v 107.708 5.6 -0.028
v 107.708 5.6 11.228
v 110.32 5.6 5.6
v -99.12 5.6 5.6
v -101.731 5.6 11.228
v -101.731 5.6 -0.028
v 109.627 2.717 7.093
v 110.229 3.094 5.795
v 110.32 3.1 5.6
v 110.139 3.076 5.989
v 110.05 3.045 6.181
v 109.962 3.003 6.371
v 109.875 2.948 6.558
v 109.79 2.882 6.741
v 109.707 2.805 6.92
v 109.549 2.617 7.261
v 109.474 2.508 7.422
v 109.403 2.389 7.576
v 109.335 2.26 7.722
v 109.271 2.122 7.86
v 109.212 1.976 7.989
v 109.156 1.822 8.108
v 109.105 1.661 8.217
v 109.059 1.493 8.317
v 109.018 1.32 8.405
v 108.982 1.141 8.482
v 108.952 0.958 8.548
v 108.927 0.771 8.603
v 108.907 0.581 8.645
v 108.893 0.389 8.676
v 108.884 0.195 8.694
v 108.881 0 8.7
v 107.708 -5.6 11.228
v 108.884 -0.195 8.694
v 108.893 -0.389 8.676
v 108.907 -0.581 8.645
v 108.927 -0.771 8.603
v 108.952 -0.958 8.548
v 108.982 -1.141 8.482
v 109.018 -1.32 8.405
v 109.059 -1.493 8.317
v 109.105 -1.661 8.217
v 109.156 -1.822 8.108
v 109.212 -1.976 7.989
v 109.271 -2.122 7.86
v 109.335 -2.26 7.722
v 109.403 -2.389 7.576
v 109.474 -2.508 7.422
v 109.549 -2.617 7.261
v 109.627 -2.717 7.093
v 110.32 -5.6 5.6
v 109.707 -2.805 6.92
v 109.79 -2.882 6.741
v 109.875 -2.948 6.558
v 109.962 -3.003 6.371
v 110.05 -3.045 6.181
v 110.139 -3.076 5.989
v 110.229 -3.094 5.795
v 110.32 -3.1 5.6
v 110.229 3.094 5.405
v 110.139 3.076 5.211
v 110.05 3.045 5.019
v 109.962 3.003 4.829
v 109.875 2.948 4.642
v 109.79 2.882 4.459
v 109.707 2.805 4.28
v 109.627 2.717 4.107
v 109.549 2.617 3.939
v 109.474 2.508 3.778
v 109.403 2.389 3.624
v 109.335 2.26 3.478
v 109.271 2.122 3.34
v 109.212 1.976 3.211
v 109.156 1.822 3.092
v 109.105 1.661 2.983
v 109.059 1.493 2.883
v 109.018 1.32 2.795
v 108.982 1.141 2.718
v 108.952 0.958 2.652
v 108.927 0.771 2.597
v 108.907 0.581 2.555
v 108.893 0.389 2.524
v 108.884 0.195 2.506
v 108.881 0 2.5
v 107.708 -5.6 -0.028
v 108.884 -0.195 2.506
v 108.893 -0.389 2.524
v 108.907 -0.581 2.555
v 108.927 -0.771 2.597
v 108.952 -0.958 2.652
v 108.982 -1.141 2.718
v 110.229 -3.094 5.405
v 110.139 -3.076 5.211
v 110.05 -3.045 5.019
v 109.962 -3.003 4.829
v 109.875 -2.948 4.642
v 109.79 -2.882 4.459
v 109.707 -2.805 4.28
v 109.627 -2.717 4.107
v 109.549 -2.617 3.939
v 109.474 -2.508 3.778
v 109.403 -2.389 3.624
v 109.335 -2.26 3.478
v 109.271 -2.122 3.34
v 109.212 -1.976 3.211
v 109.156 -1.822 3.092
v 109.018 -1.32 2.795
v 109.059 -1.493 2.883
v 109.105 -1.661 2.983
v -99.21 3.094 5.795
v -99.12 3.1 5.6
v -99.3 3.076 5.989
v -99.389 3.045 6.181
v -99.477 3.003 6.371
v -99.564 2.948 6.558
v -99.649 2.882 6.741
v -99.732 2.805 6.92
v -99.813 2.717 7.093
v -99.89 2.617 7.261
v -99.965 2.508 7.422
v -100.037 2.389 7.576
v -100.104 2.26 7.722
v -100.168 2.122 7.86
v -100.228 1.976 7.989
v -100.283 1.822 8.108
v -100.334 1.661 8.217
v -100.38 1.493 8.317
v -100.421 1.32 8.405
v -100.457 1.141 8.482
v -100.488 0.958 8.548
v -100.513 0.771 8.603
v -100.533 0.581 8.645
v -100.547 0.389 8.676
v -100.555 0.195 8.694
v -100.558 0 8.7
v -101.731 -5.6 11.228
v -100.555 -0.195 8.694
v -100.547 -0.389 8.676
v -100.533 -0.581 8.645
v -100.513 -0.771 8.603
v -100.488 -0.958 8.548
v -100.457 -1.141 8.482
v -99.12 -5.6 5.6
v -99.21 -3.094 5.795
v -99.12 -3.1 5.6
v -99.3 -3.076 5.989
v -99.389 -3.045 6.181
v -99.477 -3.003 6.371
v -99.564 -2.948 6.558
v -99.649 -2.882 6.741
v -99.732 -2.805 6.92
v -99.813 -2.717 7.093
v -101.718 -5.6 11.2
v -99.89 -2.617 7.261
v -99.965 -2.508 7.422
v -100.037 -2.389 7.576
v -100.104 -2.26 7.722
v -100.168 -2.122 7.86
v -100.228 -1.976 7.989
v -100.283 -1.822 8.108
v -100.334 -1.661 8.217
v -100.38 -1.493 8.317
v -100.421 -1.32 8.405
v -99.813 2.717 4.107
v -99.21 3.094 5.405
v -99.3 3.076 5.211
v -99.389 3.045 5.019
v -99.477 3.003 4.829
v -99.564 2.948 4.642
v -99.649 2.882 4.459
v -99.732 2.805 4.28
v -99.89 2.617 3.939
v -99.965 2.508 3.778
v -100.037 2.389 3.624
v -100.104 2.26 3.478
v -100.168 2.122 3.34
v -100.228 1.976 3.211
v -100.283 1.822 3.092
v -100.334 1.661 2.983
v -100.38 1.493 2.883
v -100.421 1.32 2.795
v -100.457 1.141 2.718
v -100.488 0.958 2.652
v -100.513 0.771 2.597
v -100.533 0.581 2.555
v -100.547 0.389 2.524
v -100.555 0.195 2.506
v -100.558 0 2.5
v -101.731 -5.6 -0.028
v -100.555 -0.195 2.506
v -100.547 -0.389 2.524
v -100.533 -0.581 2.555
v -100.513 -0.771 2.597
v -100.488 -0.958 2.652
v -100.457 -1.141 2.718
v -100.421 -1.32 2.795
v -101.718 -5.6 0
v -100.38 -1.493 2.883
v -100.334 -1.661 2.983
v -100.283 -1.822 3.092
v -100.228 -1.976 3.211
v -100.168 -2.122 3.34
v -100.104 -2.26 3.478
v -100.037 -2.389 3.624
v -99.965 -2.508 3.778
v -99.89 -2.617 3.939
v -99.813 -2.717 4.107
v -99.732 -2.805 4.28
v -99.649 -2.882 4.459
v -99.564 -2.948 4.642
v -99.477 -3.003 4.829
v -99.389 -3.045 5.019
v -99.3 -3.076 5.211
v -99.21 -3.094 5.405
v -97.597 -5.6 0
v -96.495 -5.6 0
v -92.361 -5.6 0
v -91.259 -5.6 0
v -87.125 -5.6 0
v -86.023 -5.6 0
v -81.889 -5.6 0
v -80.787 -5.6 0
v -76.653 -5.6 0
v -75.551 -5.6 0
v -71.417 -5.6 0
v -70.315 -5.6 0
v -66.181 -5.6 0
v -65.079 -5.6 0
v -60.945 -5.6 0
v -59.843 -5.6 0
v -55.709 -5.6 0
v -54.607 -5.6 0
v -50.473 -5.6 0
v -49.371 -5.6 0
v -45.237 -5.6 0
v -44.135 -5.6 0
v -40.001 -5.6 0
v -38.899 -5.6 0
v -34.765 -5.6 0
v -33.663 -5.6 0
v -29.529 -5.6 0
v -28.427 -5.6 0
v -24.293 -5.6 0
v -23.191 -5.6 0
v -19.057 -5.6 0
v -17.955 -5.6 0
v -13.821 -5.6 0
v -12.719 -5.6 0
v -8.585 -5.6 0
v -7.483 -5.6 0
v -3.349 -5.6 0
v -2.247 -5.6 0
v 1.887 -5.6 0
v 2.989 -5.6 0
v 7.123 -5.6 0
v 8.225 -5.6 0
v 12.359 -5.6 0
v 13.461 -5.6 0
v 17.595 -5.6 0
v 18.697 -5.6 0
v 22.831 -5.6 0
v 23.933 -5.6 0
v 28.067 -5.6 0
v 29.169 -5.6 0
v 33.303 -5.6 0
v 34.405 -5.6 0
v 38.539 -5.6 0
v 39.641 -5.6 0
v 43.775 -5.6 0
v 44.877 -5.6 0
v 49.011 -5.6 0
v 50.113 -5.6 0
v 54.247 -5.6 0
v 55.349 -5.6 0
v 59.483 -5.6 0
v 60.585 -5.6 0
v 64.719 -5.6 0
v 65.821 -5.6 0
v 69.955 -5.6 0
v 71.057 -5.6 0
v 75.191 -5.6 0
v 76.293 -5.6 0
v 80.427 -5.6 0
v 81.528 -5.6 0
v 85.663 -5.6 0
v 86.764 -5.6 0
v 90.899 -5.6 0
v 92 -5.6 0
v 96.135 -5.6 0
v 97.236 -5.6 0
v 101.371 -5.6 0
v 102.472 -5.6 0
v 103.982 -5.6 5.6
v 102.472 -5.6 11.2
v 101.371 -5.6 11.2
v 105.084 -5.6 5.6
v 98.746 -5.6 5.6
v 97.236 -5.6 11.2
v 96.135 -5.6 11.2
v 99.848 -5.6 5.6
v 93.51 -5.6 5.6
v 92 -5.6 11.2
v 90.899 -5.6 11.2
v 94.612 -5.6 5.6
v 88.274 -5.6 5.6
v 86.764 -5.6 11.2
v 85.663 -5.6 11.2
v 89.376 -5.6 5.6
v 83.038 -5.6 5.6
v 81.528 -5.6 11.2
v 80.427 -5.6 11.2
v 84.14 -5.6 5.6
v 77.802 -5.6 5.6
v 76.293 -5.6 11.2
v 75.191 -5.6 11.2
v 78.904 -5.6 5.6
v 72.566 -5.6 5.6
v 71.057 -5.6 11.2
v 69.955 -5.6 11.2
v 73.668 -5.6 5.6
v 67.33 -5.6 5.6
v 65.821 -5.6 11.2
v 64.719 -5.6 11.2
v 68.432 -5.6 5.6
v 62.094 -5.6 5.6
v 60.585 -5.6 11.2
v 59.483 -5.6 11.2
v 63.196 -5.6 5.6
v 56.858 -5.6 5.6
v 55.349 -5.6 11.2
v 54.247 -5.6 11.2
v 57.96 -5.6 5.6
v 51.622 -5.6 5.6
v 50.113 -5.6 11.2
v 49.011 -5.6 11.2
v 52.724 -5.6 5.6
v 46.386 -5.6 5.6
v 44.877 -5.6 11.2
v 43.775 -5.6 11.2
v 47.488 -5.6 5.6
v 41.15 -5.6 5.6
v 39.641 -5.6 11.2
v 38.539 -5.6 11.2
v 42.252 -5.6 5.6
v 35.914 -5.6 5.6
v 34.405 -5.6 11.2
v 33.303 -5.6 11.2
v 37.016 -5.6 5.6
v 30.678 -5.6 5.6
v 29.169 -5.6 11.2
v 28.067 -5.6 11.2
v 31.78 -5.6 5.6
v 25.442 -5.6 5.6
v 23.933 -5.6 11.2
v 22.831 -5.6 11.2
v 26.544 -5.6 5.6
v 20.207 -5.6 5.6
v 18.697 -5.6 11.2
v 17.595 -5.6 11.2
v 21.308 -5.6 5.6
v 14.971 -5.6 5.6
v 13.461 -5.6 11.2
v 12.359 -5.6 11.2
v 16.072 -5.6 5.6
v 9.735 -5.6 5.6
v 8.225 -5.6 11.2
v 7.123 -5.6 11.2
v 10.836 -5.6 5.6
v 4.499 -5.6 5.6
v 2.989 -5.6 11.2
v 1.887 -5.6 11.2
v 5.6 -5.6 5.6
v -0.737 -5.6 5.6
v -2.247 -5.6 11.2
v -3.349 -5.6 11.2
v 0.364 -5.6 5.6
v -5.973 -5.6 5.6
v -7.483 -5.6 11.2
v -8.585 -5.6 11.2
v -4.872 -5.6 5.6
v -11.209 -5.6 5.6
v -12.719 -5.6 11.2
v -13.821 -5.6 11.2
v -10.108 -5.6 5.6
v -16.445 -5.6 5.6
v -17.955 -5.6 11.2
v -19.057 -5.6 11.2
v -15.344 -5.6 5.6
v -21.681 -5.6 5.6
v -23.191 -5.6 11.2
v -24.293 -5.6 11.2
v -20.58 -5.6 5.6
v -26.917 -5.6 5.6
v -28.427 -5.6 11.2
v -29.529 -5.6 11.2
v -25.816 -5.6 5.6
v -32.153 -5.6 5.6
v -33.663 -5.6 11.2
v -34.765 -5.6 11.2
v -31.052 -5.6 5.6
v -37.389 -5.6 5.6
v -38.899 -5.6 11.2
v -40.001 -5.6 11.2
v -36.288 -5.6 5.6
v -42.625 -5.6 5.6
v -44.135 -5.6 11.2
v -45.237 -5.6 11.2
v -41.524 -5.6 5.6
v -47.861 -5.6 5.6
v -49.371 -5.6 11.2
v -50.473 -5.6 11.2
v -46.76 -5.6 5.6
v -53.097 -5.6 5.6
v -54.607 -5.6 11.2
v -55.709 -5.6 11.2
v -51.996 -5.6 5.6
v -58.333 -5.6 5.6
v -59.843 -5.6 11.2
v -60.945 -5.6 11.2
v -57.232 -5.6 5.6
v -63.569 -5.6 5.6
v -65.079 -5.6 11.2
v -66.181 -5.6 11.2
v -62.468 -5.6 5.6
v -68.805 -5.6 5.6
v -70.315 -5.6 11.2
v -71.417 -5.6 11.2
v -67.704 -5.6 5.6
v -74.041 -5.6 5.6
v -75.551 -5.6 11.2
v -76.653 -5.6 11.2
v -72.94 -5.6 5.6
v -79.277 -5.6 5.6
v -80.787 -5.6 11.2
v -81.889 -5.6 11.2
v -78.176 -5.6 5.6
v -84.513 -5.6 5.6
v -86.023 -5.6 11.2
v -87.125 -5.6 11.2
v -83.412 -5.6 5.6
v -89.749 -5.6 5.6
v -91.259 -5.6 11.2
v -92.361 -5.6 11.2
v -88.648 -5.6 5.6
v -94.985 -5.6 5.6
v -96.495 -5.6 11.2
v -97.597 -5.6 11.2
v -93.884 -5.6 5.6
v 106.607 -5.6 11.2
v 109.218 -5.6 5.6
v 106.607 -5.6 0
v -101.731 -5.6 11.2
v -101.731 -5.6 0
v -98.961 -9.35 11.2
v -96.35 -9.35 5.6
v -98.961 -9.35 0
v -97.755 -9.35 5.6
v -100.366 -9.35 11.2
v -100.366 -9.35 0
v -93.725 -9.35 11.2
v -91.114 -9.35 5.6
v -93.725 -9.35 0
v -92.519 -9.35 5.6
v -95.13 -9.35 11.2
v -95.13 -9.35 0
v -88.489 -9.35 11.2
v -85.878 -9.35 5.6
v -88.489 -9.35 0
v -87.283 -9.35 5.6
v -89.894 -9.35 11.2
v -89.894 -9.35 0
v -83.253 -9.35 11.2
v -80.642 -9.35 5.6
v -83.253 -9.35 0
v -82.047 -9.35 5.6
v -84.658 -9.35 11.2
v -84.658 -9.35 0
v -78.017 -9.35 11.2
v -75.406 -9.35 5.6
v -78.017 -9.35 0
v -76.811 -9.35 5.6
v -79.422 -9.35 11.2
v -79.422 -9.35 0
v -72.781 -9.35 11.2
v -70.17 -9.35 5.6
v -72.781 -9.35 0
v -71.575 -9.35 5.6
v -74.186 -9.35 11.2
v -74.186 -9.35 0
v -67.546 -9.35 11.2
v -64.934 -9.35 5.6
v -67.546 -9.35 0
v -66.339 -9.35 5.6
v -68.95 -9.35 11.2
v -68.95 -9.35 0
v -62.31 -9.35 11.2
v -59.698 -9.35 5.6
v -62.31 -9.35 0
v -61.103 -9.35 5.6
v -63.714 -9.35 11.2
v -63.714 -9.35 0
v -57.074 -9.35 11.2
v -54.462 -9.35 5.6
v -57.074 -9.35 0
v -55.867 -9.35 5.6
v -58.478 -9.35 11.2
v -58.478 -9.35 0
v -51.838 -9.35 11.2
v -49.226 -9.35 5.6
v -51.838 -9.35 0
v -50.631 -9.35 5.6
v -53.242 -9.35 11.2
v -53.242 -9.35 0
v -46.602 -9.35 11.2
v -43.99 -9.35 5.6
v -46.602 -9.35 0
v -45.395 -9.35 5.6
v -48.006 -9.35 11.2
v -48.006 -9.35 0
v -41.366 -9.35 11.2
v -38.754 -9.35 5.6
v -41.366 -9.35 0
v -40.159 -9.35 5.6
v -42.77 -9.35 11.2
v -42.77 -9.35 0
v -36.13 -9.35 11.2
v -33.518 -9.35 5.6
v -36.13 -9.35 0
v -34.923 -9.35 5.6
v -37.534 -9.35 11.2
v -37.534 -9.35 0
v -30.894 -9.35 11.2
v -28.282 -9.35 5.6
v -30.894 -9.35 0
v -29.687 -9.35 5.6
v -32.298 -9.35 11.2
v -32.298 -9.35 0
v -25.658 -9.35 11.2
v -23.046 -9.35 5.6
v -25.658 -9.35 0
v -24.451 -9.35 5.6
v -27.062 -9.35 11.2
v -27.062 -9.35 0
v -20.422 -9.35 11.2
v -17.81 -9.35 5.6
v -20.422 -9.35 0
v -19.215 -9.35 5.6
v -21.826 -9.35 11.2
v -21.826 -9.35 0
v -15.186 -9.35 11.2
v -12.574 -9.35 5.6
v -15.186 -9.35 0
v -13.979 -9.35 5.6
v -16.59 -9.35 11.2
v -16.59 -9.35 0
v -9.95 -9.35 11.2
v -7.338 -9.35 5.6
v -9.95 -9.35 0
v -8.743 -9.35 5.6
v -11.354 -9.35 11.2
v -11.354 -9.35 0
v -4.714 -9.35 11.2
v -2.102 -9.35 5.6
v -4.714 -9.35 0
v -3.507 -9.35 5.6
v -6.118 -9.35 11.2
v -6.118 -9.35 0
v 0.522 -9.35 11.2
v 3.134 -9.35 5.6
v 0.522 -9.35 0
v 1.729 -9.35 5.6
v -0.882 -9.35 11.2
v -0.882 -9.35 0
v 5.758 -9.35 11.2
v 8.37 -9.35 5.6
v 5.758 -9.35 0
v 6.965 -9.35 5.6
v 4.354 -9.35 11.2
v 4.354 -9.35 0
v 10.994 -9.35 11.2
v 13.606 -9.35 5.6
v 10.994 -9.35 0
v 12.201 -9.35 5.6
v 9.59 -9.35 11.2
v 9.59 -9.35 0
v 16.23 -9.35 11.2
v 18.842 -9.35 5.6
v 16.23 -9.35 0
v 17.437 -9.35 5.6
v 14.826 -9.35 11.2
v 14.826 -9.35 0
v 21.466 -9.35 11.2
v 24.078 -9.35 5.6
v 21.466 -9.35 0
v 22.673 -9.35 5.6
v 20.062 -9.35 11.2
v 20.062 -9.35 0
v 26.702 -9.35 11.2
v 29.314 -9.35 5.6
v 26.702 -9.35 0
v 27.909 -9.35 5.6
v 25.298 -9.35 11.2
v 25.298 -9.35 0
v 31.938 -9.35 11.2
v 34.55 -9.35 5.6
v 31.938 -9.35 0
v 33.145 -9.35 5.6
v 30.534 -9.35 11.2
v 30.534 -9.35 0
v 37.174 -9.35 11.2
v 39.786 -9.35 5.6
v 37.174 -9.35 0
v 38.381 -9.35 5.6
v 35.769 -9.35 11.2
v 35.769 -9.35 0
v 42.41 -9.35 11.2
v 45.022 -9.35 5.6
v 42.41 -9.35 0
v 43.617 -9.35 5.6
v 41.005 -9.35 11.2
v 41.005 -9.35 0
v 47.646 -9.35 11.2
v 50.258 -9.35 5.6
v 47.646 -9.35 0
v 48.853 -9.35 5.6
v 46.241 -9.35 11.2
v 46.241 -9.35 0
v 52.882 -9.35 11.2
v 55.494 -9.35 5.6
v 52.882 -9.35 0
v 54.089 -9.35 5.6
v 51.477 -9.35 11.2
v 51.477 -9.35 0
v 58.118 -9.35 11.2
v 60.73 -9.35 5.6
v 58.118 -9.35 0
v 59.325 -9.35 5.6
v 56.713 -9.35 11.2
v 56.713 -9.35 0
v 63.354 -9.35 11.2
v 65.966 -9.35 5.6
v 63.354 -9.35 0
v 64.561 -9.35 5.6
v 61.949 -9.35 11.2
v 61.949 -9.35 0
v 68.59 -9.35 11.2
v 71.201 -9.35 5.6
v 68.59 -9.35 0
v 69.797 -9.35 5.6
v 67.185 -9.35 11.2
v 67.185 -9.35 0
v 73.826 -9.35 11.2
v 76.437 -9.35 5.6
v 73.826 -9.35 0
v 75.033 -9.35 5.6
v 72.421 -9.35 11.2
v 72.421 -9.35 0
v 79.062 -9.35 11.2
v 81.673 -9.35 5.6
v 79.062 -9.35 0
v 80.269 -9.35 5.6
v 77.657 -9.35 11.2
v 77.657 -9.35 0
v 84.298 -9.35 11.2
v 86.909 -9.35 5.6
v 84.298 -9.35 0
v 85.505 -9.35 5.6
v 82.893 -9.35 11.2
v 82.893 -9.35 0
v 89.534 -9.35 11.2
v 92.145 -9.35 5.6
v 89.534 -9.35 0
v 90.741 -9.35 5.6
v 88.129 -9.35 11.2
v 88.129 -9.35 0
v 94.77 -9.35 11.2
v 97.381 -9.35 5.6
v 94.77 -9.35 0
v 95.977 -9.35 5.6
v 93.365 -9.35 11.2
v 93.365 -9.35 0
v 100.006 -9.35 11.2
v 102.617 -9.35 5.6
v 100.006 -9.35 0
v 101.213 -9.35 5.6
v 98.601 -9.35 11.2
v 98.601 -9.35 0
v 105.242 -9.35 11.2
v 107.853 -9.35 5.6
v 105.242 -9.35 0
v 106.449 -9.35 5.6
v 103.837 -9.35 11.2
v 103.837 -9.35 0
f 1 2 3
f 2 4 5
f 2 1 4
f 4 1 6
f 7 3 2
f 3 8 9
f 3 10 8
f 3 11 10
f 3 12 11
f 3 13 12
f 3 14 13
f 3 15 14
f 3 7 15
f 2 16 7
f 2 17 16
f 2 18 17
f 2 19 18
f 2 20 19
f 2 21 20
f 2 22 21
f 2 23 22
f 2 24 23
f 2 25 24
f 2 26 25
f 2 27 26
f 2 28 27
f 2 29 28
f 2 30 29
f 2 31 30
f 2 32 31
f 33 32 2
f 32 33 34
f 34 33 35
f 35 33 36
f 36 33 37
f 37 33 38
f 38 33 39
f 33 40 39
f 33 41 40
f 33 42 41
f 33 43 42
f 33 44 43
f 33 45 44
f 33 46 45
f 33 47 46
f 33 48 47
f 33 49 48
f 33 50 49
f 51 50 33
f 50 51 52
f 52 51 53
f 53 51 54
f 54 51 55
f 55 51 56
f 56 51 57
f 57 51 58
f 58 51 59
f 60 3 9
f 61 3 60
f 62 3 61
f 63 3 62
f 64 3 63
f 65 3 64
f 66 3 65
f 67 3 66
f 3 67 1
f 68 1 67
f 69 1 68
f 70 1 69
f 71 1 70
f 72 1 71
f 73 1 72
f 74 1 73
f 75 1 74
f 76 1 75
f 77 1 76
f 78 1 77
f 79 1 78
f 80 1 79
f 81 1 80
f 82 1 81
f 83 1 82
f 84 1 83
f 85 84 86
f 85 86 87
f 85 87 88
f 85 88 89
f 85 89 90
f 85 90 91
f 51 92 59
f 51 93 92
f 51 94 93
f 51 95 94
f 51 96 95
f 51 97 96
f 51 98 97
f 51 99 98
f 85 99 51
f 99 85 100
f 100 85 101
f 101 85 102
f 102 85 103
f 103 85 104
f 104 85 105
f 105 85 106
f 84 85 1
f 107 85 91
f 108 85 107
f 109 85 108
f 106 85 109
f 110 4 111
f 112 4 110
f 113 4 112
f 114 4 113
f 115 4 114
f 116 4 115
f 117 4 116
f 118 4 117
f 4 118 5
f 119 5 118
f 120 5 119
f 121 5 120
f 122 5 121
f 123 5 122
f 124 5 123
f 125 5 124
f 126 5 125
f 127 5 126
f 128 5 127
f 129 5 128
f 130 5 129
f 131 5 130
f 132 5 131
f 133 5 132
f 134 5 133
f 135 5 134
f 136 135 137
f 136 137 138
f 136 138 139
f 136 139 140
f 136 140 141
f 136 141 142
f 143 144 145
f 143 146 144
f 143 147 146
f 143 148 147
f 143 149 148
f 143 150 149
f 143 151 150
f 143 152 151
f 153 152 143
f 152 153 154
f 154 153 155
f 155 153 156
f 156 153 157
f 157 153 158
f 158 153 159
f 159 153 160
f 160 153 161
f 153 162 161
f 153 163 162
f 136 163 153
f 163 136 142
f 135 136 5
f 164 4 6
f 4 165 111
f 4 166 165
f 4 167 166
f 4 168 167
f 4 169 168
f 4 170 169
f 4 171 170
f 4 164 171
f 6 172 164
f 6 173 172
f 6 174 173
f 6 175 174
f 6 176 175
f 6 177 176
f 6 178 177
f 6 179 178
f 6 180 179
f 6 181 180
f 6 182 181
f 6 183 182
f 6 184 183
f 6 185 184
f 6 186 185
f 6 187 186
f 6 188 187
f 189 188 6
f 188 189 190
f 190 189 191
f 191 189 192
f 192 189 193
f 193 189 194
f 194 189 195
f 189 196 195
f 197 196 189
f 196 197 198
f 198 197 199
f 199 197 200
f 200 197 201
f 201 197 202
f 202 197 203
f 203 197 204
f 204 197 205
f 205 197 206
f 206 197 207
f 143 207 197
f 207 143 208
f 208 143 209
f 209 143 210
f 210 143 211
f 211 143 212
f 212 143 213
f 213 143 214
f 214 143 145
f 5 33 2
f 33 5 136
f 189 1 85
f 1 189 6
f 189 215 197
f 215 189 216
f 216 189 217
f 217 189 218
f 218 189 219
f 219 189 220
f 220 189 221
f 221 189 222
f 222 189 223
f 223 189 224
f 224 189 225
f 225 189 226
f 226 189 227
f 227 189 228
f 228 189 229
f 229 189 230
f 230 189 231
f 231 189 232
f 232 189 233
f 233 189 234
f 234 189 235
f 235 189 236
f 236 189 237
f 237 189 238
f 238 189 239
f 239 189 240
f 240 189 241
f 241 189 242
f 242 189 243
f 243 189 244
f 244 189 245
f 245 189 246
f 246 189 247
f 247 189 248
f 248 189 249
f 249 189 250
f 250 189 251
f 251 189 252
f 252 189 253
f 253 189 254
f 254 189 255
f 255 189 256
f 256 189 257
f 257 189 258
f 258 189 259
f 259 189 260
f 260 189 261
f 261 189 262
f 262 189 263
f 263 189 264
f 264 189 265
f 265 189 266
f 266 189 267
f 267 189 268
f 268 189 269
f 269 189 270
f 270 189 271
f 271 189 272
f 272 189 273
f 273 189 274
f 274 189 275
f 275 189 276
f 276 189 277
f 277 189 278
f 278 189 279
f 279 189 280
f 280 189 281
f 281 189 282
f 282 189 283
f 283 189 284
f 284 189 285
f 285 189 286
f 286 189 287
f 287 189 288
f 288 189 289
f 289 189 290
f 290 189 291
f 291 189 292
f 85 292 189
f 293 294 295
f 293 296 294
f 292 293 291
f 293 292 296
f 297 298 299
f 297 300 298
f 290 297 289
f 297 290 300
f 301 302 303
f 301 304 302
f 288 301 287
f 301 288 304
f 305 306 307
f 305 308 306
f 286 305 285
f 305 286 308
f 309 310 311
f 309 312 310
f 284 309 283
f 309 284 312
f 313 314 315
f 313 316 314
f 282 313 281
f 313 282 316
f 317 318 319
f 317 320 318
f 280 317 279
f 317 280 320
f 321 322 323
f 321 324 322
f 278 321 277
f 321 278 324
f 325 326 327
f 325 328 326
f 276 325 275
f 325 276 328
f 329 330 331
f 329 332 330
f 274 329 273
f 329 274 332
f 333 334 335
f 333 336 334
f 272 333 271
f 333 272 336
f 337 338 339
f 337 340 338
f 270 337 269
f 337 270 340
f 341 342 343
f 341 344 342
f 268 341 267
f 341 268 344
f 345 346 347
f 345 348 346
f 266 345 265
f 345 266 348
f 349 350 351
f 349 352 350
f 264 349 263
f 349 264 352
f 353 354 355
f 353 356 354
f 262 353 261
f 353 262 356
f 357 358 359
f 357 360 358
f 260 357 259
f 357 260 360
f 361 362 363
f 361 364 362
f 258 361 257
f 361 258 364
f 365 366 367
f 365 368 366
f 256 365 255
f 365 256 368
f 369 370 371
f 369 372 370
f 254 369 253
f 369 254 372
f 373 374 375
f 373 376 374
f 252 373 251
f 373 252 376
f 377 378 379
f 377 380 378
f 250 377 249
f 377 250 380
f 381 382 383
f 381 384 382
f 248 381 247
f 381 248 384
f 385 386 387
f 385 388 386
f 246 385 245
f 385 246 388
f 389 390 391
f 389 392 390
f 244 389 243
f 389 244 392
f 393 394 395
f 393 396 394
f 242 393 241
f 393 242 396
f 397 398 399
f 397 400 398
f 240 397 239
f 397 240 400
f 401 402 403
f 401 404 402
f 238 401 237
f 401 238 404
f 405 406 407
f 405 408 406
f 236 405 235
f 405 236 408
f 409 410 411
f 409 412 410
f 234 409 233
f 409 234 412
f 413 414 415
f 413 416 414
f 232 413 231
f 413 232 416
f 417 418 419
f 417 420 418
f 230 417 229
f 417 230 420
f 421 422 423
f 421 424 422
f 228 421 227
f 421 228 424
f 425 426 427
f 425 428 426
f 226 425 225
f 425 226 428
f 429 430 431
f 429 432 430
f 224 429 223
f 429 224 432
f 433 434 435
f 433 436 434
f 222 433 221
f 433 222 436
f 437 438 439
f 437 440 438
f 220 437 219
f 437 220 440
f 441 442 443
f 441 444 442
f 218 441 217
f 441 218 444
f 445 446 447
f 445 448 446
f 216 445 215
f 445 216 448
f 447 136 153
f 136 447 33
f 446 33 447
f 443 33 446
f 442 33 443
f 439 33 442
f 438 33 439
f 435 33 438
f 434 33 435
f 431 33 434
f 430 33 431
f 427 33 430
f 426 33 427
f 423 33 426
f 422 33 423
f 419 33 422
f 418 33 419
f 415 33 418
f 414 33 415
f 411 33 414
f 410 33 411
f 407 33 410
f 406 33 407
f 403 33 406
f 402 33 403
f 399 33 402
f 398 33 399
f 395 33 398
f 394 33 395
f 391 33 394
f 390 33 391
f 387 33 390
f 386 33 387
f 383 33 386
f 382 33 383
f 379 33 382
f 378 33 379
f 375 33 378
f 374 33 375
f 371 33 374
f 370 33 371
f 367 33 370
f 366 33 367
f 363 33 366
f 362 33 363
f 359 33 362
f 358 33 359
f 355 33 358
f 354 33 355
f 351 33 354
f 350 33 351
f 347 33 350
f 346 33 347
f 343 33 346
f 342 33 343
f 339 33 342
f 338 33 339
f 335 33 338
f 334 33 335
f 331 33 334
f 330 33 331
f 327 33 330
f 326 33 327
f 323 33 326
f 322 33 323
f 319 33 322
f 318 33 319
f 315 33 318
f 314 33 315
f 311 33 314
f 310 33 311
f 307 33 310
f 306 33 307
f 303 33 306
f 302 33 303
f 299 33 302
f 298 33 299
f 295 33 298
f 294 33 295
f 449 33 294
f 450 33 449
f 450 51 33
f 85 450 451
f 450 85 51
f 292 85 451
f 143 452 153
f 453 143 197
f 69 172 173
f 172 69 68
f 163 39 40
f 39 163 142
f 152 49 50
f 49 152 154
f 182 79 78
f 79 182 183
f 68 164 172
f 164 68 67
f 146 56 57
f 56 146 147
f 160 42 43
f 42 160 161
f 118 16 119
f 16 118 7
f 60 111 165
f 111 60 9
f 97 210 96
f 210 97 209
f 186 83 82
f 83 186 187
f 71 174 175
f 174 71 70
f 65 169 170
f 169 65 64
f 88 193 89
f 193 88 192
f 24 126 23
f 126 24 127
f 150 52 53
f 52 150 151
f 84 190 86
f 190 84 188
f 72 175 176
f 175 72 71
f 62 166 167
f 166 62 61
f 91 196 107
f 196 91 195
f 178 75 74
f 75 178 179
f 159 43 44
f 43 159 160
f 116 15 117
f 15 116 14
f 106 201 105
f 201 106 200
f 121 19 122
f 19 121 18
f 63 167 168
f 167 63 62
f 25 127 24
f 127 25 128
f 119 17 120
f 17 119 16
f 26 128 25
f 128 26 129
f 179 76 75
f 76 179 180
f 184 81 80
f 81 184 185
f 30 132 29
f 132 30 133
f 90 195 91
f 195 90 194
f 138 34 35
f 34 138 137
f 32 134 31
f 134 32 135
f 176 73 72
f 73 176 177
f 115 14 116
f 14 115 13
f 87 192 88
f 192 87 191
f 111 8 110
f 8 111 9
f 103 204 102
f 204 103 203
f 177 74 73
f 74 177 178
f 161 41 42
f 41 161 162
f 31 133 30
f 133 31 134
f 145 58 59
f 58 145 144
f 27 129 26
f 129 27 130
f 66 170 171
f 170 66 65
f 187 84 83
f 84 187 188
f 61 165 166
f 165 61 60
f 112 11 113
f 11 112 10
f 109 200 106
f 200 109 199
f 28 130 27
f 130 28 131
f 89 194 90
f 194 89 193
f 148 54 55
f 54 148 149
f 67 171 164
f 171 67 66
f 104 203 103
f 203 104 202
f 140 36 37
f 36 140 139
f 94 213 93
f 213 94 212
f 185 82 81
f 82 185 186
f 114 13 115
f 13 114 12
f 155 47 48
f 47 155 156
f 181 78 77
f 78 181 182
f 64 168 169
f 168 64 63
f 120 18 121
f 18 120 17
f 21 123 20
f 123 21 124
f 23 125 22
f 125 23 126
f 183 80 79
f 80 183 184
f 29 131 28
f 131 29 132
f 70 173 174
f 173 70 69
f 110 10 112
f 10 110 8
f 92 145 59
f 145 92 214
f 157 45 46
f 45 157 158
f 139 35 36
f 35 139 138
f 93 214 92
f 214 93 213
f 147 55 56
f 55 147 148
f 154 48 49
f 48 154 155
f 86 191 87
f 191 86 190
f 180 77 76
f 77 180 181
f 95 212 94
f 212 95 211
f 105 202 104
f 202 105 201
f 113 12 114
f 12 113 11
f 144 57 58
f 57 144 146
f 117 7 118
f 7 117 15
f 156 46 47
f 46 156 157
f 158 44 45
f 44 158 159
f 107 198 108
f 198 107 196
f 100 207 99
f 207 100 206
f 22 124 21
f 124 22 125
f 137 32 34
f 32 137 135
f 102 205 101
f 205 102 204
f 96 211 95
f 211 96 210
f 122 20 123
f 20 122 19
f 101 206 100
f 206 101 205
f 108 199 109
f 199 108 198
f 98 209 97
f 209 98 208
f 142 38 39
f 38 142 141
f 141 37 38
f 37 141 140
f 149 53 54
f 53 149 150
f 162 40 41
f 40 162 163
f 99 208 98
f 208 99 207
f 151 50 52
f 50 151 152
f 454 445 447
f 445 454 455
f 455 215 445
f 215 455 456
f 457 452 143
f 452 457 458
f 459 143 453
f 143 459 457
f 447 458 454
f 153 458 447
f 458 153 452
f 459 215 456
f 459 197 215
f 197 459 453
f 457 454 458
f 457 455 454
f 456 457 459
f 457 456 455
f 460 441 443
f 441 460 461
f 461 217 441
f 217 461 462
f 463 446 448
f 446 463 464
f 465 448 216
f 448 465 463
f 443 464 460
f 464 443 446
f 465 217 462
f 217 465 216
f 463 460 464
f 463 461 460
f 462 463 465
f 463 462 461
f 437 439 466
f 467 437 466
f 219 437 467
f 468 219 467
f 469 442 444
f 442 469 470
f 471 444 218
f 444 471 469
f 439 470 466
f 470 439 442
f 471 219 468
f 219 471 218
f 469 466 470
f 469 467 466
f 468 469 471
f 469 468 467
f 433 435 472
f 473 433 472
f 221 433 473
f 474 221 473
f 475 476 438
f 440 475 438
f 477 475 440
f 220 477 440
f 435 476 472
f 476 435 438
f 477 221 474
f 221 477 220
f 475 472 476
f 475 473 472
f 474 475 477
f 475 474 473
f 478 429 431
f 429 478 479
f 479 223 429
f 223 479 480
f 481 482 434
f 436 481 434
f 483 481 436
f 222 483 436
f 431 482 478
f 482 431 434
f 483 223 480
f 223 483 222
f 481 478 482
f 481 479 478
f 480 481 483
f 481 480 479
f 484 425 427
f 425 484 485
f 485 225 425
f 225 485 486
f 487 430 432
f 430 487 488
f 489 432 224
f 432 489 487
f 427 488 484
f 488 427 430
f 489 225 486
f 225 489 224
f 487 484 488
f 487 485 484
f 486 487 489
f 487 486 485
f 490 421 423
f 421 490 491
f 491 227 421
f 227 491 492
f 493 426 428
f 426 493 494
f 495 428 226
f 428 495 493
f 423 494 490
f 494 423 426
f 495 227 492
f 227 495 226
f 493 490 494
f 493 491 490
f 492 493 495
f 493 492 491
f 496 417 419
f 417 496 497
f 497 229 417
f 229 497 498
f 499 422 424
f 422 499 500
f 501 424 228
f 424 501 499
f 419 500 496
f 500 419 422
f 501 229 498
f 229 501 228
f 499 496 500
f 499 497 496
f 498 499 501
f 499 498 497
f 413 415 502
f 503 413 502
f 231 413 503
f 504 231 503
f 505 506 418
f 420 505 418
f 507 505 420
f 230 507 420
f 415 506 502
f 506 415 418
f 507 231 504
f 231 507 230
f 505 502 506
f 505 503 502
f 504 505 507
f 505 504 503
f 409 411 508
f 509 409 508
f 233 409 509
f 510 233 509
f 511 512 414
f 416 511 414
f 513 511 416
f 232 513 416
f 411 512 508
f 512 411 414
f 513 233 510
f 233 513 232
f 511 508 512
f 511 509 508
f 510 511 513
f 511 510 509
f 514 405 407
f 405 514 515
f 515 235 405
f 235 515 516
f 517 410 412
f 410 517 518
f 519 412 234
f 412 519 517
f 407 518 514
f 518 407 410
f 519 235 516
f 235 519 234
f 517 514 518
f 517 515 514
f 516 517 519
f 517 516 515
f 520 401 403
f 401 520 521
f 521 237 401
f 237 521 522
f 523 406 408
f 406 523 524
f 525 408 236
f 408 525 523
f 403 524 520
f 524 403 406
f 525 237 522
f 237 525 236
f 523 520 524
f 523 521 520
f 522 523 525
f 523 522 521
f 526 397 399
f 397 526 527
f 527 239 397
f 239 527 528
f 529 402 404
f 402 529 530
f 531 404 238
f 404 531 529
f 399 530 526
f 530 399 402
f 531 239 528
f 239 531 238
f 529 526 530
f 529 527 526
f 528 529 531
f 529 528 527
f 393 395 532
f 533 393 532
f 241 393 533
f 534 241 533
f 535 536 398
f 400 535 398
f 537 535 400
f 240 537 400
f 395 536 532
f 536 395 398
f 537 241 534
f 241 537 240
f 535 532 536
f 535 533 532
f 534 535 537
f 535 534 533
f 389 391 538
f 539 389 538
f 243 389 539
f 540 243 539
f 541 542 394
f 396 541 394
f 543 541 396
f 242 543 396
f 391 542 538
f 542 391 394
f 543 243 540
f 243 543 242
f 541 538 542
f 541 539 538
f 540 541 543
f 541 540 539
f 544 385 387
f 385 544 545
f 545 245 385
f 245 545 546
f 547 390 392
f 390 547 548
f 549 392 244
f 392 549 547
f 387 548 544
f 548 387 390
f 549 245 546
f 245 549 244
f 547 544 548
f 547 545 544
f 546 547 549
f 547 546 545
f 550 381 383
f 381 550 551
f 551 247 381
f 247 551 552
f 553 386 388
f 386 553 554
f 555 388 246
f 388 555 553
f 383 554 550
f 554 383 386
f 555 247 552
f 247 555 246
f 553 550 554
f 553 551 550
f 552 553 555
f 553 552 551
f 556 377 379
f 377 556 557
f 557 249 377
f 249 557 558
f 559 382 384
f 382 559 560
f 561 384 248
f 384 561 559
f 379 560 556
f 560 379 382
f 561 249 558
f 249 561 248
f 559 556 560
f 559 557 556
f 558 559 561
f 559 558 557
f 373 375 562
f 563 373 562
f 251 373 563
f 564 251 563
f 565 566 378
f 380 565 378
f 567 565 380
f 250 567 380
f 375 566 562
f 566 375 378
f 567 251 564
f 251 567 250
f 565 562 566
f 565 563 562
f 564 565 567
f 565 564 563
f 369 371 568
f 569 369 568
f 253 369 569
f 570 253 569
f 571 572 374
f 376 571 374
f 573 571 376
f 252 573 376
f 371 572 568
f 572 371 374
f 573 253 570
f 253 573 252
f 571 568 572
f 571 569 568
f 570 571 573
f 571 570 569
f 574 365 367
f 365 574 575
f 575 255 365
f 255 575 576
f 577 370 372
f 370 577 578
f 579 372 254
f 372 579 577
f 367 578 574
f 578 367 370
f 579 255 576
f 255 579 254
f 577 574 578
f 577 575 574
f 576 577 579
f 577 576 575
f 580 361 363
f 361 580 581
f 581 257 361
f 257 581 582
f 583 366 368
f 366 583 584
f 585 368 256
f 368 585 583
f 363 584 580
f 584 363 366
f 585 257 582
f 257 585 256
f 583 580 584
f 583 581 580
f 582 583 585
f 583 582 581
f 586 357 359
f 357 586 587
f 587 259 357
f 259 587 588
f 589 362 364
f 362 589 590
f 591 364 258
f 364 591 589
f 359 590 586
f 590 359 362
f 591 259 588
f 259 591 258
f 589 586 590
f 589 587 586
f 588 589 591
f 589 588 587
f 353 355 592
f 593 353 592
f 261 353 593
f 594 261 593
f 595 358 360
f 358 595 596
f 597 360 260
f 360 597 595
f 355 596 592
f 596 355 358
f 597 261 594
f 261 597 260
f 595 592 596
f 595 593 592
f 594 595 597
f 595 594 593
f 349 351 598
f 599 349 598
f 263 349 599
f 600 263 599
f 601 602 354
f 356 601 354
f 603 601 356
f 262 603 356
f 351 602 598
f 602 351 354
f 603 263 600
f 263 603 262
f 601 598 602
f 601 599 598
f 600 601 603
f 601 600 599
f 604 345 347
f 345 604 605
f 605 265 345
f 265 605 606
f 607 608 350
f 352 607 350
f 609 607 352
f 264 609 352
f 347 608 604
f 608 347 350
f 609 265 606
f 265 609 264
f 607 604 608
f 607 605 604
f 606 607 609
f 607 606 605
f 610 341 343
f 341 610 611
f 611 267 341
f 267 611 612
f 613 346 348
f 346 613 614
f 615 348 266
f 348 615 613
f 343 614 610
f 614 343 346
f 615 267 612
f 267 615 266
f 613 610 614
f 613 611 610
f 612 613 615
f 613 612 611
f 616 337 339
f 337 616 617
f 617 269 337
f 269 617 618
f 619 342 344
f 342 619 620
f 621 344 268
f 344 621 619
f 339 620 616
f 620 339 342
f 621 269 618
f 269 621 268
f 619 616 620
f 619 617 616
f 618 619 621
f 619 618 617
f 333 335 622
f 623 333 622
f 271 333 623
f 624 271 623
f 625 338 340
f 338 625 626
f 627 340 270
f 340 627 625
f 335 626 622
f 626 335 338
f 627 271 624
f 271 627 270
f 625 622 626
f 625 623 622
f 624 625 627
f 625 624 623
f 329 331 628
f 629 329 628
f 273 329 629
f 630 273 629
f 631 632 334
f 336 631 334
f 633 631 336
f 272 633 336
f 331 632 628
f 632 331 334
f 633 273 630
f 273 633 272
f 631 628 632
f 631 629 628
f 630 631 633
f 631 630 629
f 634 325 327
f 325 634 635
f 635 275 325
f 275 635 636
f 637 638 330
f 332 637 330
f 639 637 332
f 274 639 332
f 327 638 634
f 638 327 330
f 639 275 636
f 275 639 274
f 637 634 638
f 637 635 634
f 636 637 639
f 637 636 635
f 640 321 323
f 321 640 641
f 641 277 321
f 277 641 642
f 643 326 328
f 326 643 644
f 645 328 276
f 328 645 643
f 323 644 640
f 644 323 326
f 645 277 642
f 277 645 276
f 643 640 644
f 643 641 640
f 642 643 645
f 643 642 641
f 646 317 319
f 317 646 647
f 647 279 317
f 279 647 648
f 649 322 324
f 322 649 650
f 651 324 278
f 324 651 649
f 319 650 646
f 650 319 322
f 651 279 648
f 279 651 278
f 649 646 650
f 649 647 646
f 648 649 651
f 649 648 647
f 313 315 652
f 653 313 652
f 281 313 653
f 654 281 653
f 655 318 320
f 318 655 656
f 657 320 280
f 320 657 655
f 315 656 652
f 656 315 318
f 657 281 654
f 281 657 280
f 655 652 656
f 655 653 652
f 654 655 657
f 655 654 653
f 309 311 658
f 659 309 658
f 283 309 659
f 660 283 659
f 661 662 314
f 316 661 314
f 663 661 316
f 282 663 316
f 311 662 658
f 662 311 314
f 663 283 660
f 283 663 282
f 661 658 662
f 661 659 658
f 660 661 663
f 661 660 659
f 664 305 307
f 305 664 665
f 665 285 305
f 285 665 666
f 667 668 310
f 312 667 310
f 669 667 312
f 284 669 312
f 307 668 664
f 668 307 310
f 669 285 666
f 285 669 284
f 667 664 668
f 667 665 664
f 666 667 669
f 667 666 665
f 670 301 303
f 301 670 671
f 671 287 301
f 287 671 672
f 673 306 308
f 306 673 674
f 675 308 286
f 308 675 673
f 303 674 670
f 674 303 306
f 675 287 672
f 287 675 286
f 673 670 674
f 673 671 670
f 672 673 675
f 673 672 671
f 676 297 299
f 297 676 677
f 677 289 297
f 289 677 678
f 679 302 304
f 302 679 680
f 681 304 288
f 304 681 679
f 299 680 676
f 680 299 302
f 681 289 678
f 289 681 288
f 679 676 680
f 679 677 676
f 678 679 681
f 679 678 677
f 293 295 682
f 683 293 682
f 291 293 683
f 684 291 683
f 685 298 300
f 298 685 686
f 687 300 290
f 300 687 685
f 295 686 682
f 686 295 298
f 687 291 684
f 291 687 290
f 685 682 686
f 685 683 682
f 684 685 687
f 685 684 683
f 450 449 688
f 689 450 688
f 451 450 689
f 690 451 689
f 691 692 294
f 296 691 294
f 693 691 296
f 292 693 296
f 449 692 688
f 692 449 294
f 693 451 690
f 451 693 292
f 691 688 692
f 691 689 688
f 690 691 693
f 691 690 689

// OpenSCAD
// Parametric Modular Rack Mark "Ckaos" Moissette
//Based on the work of MattMoses and Fdavies :
//http://forums.reprap.org/read.php?1,51452,52099#msg-52099
//and Forrest Higgs:
// http://technocraticanarchist.blogspot.com/2010/01/high-speed-alternative-to-belts.html
//It is licensed under the Creative Commons - GNU GPL license.
// © 2011 by Mark "Ckaos" Moissette
//more info at :www.kaosat.net and
//http://www.thingiverse.com/thing:6011



pi=3.1415926535897932384626433832795;
innerRadius=3.1;//shaft radius, in mm
borders=2.5;//how thick should the borders around the central "shaft" be, in mm
diametralPitch=12;
numberOfTeeth=40;
pressureAngle=20*pi/180;
centerAngle=25;//angle at center of teeth


//example usage
rack(innerRadius,borders,diametralPitch,numberOfTeeth,pressureAngle,centerAngle);



module rack(innerRadius,borders,P,N,PA,CA)
{
	// P = diametral pitch
	// N = number of teeth
	// PA = pressure angle in radians
	// x, y = linear offset distances
	a = 1/P; // addendum (also known as "module")
	d = 1.25/P; // dedendum (this is set by a standard)
	multiplier=20;//20
	height=(d+a)*multiplier;
	
	
	// find the tangent of pressure angle once
	tanPA = tan(PA*(180/pi));
	// length of bottom and top horizontal segments of tooth profile
	botL = (pi/P/2 - 2*d*tanPA)*multiplier;
	topL =( pi/P/2 - 2*a*tanPA)*multiplier;

	slantLng=tanPA*height;
	realBase=2*slantLng+topL;
	
	
	offset=topL+botL+2*slantLng;
	length=(realBase+botL)*N;

	supportSize=(innerRadius+borders)*2;

	//calculate tooth params
	basesegmentL=realBase/2;
	basesegmentW=supportSize/2;

	topsegmentL=topL/2;
	topsegmentW=supportSize/2;

	baseoffsetY=tan(CA)*basesegmentW;
	topoffsetY=tan(CA)*topsegmentW;
	
	//calculate support params

	totalSupportLength=(N)*(offset);
	supportL=totalSupportLength/2;
	supportW=supportSize/1.99;
	
	echo("Total length",totalSupportLength+baseoffsetY);
	echo("Total height",supportSize);

	
	rotate([90,90,0])
	{
	translate([-supportSize/2,supportSize/2,0])
	{
	union()
	{
		difference()
		{
			support(supportL,supportW,supportSize,baseoffsetY);
			rotate([90,90,0]) 
			{cylinder(h=length+10,r=innerRadius,center=true,$fn=100);}
		}

	
		for (i = [0:N-1]) 
		{
			translate([0,i*offset-length/2+realBase/2,supportSize/2+height/2]) 
			{	
				
				tooth(basesegmentL,basesegmentW,topsegmentL,topsegmentW,height,baseoffsetY,topoffsetY);
				
			}
		}
	}
	
	}
	}
}

module support(supportL,supportW,height,offsetY)
{
	 tooth(supportL,supportW,supportL,supportW,height,offsetY,offsetY);
}



module tooth(basesegmentL,basesegmentW,topsegmentL,topsegmentW,height,baseoffsetY,topoffsetY)//top : width*length, same for base
{
	
	////////////////
	basePT1=[
	-basesegmentW,
	basesegmentL-baseoffsetY,
	-height/2];

	basePT2=[
	0,
	basesegmentL,
	-height/2];

	basePT3=[
	basesegmentW,
	basesegmentL-baseoffsetY,
	-height/2];

	basePT4=[
	basesegmentW,
	basesegmentL-(baseoffsetY+basesegmentL*2),
	-height/2];
	
	basePT5=[
	0,
	-basesegmentL,
	-height/2];

	basePT6=[
	-basesegmentW,
	basesegmentL-(baseoffsetY+basesegmentL*2),
	-height/2];
	//////////////////////////
	topPT1=[
	-topsegmentW,
	topsegmentL-topoffsetY,
	height/2];

	topPT2=[
	0,
	topsegmentL,
	height/2];

	topPT3=[
	topsegmentW,
	topsegmentL-topoffsetY,
	height/2];

	topPT4=[
	topsegmentW,
	topsegmentL-(topoffsetY+topsegmentL*2),
	height/2];
	
	topPT5=[
	0,
	-topsegmentL,
	height/2];

	topPT6=[
	-topsegmentW,
	topsegmentL-(topoffsetY+topsegmentL*2),
	height/2];
	//////////////////////////

	//////////////////////////

	polyhedron(
	points=[
		basePT1,
		basePT2,
		basePT3,
		basePT4,
		basePT5,
		basePT6,
		topPT1,
		topPT2,
		topPT3,
		topPT4,
		topPT5,
		topPT6],
	triangles=[
	//base
	[5,1,0],
	[4,1,5],
	[4,2,1],
	[3,2,4],	

	//front
	[1,6,0],
	[7,6,1],
	[2,7,1],
	[8,7,2],
	//back
	[11,10,5],
	[5,10,4],
	[10,9,4],
	[4,9,3],	
	//side 1
	[0,11,5],
	[6,11,0],
	//side 2
	[3,8,2],
	[9,8,3],
	//top
	[9,10,8],
	[10,7,8],
	[11,7,10],
	[6,7,11],
	]
	);
}

module demo_gear(position,diametralPitch)
{
	wheelSize=12;
rotate([0,90,180])
translate(position)

{
gear (
	number_of_teeth=8,
	circular_pitch=300, 
	pressure_angle=19.34,
	gear_thickness=wheelSize/2,
	rim_thickness=wheelSize/2,
	hub_thickness=0,
	bore_diameter=2,
	backlash=0,twist=centerAngle,involute_facets=15);

translate([0,0,wheelSize/2])
rotate([0,0,-centerAngle])
gear (
	number_of_teeth=8,
	circular_pitch=300, 
	pressure_angle=19.34,
	gear_thickness=wheelSize/2,
	rim_thickness=wheelSize/2,
	hub_thickness=0,
	bore_diameter=2,
	backlash=0,twist=-centerAngle,involute_facets=15);

}

}
